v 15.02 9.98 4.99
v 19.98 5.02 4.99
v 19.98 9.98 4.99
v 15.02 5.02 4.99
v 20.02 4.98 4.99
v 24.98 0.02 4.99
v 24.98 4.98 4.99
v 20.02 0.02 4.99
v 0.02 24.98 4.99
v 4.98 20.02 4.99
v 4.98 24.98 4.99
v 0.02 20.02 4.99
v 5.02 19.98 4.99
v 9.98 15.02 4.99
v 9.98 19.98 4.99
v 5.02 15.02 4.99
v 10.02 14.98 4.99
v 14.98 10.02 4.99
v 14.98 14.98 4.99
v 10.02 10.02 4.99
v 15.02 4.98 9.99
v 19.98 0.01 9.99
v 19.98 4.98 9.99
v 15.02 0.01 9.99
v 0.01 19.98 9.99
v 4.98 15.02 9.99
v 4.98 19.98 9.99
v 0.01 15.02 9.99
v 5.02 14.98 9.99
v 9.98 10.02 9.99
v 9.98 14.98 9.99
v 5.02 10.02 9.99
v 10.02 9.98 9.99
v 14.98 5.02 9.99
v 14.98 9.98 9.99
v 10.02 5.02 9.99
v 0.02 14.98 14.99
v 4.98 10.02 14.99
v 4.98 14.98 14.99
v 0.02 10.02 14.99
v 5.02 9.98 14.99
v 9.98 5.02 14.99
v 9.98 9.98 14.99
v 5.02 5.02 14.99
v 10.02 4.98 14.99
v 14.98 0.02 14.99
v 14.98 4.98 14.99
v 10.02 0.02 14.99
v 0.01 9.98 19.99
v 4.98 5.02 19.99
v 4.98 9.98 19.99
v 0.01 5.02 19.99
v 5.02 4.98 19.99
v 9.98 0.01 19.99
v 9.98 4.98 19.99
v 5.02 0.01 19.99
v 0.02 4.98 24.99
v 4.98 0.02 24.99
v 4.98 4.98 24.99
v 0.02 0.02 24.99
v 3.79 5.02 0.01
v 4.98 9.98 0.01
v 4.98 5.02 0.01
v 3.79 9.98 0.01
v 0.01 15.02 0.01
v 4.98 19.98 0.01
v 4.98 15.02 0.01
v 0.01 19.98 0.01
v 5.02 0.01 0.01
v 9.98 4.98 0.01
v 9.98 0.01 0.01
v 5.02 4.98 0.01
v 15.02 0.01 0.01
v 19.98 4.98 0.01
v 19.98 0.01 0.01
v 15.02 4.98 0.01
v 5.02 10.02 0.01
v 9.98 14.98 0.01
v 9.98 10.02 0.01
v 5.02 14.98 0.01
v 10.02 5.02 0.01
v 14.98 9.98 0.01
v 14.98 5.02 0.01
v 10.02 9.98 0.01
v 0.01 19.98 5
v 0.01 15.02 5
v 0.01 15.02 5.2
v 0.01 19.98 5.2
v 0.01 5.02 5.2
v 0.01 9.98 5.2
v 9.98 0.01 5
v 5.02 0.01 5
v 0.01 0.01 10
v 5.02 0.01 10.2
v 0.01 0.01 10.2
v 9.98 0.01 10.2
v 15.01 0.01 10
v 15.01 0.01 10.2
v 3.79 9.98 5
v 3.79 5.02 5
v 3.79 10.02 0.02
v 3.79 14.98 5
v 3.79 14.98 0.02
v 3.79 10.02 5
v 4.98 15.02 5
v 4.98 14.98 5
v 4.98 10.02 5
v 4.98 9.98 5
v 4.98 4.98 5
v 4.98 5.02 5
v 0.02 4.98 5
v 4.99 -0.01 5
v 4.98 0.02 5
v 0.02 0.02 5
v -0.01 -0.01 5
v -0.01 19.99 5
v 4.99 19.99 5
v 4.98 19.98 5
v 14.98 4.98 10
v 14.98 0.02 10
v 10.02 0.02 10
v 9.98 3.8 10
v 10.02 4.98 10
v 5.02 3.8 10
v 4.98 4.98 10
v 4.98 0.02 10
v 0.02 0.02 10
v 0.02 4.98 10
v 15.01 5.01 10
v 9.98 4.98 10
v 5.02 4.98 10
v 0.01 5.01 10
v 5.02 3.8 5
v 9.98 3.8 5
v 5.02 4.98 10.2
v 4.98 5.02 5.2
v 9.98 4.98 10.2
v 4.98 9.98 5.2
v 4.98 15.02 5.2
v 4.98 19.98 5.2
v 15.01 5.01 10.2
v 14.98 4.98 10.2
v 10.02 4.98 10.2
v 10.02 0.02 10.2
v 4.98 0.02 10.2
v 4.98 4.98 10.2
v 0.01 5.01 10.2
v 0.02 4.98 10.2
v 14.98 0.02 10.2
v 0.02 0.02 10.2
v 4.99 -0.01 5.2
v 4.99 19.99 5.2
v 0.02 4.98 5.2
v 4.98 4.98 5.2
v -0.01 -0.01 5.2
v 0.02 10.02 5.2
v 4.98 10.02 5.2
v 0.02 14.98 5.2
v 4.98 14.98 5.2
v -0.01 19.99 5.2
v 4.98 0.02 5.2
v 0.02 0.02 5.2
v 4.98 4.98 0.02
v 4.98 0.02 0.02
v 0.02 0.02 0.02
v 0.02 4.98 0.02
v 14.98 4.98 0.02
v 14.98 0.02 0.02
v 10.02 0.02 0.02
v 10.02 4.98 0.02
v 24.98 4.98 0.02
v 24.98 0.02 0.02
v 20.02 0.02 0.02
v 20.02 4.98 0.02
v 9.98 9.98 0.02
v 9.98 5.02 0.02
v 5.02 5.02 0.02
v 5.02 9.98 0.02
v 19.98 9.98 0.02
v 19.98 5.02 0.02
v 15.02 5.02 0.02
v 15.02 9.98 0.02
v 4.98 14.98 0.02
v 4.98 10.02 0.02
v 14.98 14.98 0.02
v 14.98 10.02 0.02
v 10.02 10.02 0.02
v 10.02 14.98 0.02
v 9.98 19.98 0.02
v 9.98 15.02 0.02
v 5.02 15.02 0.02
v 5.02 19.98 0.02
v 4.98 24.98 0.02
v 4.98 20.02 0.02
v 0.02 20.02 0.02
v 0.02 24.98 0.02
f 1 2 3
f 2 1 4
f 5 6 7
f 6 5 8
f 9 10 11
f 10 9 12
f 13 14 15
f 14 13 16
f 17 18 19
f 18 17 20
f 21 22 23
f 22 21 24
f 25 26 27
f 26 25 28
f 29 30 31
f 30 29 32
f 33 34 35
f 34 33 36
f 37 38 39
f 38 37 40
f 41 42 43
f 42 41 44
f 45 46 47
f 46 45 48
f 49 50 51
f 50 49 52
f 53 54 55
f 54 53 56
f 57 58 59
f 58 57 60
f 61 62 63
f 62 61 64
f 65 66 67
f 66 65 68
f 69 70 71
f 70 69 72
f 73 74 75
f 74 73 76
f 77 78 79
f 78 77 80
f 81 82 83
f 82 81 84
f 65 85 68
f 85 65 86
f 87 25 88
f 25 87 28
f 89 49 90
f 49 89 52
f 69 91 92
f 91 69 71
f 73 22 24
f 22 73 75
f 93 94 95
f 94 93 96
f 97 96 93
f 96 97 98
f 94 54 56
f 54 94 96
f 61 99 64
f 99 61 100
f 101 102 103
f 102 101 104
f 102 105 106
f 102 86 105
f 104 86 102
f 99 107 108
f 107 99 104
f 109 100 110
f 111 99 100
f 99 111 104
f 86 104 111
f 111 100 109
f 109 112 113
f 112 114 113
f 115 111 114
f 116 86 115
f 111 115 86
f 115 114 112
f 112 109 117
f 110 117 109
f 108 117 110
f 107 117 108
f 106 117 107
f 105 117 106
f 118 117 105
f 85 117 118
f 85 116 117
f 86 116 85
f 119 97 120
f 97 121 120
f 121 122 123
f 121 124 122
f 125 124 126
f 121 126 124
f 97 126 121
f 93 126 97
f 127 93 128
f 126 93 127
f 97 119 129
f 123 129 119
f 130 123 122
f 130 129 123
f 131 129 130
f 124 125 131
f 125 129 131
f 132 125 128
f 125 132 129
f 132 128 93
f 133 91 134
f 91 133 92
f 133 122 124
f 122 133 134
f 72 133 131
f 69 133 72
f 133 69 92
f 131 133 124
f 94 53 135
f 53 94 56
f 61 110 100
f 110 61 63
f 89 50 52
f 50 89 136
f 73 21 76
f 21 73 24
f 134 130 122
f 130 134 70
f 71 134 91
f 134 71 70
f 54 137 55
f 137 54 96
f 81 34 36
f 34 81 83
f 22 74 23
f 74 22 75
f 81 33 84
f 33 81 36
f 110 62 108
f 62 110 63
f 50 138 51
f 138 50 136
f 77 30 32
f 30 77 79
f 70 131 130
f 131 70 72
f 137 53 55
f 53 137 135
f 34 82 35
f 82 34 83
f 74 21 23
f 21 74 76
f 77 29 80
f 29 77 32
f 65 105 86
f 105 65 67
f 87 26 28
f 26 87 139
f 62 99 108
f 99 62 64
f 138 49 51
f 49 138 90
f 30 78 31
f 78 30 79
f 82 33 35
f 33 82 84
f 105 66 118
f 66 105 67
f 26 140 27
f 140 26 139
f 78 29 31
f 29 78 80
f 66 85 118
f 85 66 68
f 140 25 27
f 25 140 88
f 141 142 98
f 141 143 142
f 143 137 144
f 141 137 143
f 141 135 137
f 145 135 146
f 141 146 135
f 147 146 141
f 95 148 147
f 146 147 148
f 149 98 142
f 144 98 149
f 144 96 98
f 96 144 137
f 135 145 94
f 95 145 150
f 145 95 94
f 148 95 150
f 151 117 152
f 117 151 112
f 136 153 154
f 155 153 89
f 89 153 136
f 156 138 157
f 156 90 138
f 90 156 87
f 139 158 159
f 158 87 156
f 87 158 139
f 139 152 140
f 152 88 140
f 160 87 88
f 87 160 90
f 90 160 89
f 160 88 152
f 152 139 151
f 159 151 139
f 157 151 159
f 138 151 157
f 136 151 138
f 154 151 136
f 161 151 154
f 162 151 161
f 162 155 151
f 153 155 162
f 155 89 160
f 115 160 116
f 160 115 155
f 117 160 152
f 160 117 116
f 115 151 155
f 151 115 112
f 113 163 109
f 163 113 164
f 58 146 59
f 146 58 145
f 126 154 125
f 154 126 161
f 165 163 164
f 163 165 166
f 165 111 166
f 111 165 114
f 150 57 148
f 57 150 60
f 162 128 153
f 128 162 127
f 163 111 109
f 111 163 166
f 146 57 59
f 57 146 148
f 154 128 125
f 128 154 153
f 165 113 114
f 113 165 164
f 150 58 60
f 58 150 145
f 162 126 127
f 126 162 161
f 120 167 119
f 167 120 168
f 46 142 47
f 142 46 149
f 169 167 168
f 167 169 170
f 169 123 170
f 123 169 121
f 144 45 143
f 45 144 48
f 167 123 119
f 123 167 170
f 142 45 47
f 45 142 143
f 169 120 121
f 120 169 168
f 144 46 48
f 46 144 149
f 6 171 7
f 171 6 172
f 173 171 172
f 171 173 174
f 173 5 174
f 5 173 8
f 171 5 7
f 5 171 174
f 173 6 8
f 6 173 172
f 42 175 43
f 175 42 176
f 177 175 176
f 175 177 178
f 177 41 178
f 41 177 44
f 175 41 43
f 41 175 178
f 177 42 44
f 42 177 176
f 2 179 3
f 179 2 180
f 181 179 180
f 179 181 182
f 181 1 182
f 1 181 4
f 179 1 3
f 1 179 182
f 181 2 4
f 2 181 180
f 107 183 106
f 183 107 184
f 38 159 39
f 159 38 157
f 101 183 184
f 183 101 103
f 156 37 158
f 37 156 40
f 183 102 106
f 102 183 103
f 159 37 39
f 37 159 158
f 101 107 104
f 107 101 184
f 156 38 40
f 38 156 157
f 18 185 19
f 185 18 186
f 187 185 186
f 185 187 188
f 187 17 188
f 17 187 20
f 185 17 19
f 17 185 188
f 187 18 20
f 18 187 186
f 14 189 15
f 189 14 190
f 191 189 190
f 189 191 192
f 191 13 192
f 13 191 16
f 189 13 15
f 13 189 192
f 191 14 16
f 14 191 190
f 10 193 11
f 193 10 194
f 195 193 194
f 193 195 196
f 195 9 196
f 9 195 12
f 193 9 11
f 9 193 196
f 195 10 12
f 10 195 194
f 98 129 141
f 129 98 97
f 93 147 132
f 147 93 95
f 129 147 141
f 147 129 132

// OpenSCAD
/*
 *      Step pyramid. Test object
 *
 * Copyright (C) 2015 Mikhail Basov <RepRap[at]Basov[dot]net>
 *
 * This program is free software; you can redistribute it and/or modify
 * it under the terms of the GNU General Public License as published by
 * the Free Software Foundation; either version 3 of the License,
 * LGPL version 2.1, or (at your option) any later version of the GPL.
 *
 * This program is distributed in the hope that it will be useful,
 * but WITHOUT ANY WARRANTY; without even the implied warranty of
 * MERCHANTABILITY or FITNESS FOR A PARTICULAR PURPOSE. See the
 * GNU General Public License for more details.
 *
 * You should have received a copy of the GNU General Public License
 * along with this program; if not, write to the Free Software
 * Foundation, Inc., 59 Temple Place, Suite 330, Boston, MA 02111-1307 USA
 *
 *              2015. License, GPL v2 or later
 */

/*
 * Inspired by [5mm Calibration Cube Steps](http://www.thingiverse.com/thing:24238)
 * but no one part of origonal model sorce used.
 */

/* Start of customizer header */

/* [Model parameters] */

// - what color to generate? 
color=3; //[1:1-st color, 2:2-nd color, 3:Both colors together]

number_of_small_cubes_in_one_side=5; //[4:12]

// [mm]
small_cube_size=5;

small_bridge_test=1;//[1:true,0:false]

large_bridge_test=1;//[1:true,0:false]

/* [Print parameters] */

slicing_layer_height=0.2;

extrusion_wide=0.4;

/* [Hidden] */
// End of Customizer header

// sv - small value
sv=0.01;

slh=slicing_layer_height;
ev=extrusion_wide;
step=small_cube_size;
size=number_of_small_cubes_in_one_side;
s_bridge_f=small_bridge_test;
l_bridge_f=large_bridge_test;

/* cube_grid.scad library */
// Version 0.1 2015-08-07 (ae0a6117f)

module square_grid(xm=4, ym=4, zm=4, step=5, sv=0.001, f=1){
  // f  - is 0,0 element filled
  // sv - need to prevent "Object isn't a valid 2-manifold!"
  //      sv may be negative
  for (j=[0:ym-1]){
    if(f%2==0){
      for (i=[0:2:xm-(j%2==0?2:1)]){
        translate([step*(i+(j%2==0?1:0))-sv,j*step-sv,-sv])
          cube([step+sv*2,step+sv*2,zm*step+sv*2]);
      }
    } else {
      for (i=[0:2:xm-(j%2==0?1:2)]){
        translate([step*(i+(j%2==0?0:1))-sv,j*step-sv,-sv])
          cube([step+sv*2,step+sv*2,zm*step+sv*2]);
      }
    }
  }
}

/* end of cube_grid.scad library */

module step_pyramid(_step=step, _size=size, _sv=sv, _slh=slh, _ev=ev){
  difference(){
    translate([_sv,_sv,_sv])
      cube([_step*_size-2*_sv,_step*_size-2*_sv,_step*_size-2*_sv]);
    for (j=[0:_size-1]){
      for (i=[0:_size-1]){
          a= _step*(_size-i-j)<=0?10:0;
          translate([_step*(_size-i-j)-a, _step*i-_sv, j*_step-_sv])
            cube([_step*_size*2+a+_sv*2,_step+_sv*2,_step+sv*2]);
      }
    }
    //long bridge test
    if(l_bridge_f!=0)
      translate([-3*_ev,_step,0])
        cube([_step-_sv,2*_step+_sv,_step]);
    //short bridgr test
    if(s_bridge_f!=0)
      translate([_step,-3*_ev,_step])
        cube([_step,_step,_step]);
  }
}

module s_bridge(_slh=slh,_sv=sv){
  translate([_sv,_sv,5*2])
    cube([5*3,5,_slh]);
}

module l_bridge(_slh=slh,_sv=sv){
  translate([_sv,_sv,5])
    cube([5,5*4,_slh]);
}

module color1(){
  color("red"){
    difference(){
      step_pyramid();
      square_grid(xm=size, ym=size, zm=size+1, step=step, sv=2*sv, f=1);
      if(s_bridge_f!=0) s_bridge();
    }
    if(l_bridge_f!=0) l_bridge(_sv=-sv);
  }
}

module color2(){
  color("green"){
    difference(){
      intersection(){
        step_pyramid();
        square_grid(xm=size, ym=size, zm=size+1, step=step, sv=-2*sv, f=1);
      }
      if(l_bridge_f!=0) l_bridge();
    }
    if(s_bridge_f!=0) s_bridge(sv=-sv);
  }
}

if (color==1){
  color1();
} else if (color==2){
  color2();
} else {
  color1();
  color2();
}
